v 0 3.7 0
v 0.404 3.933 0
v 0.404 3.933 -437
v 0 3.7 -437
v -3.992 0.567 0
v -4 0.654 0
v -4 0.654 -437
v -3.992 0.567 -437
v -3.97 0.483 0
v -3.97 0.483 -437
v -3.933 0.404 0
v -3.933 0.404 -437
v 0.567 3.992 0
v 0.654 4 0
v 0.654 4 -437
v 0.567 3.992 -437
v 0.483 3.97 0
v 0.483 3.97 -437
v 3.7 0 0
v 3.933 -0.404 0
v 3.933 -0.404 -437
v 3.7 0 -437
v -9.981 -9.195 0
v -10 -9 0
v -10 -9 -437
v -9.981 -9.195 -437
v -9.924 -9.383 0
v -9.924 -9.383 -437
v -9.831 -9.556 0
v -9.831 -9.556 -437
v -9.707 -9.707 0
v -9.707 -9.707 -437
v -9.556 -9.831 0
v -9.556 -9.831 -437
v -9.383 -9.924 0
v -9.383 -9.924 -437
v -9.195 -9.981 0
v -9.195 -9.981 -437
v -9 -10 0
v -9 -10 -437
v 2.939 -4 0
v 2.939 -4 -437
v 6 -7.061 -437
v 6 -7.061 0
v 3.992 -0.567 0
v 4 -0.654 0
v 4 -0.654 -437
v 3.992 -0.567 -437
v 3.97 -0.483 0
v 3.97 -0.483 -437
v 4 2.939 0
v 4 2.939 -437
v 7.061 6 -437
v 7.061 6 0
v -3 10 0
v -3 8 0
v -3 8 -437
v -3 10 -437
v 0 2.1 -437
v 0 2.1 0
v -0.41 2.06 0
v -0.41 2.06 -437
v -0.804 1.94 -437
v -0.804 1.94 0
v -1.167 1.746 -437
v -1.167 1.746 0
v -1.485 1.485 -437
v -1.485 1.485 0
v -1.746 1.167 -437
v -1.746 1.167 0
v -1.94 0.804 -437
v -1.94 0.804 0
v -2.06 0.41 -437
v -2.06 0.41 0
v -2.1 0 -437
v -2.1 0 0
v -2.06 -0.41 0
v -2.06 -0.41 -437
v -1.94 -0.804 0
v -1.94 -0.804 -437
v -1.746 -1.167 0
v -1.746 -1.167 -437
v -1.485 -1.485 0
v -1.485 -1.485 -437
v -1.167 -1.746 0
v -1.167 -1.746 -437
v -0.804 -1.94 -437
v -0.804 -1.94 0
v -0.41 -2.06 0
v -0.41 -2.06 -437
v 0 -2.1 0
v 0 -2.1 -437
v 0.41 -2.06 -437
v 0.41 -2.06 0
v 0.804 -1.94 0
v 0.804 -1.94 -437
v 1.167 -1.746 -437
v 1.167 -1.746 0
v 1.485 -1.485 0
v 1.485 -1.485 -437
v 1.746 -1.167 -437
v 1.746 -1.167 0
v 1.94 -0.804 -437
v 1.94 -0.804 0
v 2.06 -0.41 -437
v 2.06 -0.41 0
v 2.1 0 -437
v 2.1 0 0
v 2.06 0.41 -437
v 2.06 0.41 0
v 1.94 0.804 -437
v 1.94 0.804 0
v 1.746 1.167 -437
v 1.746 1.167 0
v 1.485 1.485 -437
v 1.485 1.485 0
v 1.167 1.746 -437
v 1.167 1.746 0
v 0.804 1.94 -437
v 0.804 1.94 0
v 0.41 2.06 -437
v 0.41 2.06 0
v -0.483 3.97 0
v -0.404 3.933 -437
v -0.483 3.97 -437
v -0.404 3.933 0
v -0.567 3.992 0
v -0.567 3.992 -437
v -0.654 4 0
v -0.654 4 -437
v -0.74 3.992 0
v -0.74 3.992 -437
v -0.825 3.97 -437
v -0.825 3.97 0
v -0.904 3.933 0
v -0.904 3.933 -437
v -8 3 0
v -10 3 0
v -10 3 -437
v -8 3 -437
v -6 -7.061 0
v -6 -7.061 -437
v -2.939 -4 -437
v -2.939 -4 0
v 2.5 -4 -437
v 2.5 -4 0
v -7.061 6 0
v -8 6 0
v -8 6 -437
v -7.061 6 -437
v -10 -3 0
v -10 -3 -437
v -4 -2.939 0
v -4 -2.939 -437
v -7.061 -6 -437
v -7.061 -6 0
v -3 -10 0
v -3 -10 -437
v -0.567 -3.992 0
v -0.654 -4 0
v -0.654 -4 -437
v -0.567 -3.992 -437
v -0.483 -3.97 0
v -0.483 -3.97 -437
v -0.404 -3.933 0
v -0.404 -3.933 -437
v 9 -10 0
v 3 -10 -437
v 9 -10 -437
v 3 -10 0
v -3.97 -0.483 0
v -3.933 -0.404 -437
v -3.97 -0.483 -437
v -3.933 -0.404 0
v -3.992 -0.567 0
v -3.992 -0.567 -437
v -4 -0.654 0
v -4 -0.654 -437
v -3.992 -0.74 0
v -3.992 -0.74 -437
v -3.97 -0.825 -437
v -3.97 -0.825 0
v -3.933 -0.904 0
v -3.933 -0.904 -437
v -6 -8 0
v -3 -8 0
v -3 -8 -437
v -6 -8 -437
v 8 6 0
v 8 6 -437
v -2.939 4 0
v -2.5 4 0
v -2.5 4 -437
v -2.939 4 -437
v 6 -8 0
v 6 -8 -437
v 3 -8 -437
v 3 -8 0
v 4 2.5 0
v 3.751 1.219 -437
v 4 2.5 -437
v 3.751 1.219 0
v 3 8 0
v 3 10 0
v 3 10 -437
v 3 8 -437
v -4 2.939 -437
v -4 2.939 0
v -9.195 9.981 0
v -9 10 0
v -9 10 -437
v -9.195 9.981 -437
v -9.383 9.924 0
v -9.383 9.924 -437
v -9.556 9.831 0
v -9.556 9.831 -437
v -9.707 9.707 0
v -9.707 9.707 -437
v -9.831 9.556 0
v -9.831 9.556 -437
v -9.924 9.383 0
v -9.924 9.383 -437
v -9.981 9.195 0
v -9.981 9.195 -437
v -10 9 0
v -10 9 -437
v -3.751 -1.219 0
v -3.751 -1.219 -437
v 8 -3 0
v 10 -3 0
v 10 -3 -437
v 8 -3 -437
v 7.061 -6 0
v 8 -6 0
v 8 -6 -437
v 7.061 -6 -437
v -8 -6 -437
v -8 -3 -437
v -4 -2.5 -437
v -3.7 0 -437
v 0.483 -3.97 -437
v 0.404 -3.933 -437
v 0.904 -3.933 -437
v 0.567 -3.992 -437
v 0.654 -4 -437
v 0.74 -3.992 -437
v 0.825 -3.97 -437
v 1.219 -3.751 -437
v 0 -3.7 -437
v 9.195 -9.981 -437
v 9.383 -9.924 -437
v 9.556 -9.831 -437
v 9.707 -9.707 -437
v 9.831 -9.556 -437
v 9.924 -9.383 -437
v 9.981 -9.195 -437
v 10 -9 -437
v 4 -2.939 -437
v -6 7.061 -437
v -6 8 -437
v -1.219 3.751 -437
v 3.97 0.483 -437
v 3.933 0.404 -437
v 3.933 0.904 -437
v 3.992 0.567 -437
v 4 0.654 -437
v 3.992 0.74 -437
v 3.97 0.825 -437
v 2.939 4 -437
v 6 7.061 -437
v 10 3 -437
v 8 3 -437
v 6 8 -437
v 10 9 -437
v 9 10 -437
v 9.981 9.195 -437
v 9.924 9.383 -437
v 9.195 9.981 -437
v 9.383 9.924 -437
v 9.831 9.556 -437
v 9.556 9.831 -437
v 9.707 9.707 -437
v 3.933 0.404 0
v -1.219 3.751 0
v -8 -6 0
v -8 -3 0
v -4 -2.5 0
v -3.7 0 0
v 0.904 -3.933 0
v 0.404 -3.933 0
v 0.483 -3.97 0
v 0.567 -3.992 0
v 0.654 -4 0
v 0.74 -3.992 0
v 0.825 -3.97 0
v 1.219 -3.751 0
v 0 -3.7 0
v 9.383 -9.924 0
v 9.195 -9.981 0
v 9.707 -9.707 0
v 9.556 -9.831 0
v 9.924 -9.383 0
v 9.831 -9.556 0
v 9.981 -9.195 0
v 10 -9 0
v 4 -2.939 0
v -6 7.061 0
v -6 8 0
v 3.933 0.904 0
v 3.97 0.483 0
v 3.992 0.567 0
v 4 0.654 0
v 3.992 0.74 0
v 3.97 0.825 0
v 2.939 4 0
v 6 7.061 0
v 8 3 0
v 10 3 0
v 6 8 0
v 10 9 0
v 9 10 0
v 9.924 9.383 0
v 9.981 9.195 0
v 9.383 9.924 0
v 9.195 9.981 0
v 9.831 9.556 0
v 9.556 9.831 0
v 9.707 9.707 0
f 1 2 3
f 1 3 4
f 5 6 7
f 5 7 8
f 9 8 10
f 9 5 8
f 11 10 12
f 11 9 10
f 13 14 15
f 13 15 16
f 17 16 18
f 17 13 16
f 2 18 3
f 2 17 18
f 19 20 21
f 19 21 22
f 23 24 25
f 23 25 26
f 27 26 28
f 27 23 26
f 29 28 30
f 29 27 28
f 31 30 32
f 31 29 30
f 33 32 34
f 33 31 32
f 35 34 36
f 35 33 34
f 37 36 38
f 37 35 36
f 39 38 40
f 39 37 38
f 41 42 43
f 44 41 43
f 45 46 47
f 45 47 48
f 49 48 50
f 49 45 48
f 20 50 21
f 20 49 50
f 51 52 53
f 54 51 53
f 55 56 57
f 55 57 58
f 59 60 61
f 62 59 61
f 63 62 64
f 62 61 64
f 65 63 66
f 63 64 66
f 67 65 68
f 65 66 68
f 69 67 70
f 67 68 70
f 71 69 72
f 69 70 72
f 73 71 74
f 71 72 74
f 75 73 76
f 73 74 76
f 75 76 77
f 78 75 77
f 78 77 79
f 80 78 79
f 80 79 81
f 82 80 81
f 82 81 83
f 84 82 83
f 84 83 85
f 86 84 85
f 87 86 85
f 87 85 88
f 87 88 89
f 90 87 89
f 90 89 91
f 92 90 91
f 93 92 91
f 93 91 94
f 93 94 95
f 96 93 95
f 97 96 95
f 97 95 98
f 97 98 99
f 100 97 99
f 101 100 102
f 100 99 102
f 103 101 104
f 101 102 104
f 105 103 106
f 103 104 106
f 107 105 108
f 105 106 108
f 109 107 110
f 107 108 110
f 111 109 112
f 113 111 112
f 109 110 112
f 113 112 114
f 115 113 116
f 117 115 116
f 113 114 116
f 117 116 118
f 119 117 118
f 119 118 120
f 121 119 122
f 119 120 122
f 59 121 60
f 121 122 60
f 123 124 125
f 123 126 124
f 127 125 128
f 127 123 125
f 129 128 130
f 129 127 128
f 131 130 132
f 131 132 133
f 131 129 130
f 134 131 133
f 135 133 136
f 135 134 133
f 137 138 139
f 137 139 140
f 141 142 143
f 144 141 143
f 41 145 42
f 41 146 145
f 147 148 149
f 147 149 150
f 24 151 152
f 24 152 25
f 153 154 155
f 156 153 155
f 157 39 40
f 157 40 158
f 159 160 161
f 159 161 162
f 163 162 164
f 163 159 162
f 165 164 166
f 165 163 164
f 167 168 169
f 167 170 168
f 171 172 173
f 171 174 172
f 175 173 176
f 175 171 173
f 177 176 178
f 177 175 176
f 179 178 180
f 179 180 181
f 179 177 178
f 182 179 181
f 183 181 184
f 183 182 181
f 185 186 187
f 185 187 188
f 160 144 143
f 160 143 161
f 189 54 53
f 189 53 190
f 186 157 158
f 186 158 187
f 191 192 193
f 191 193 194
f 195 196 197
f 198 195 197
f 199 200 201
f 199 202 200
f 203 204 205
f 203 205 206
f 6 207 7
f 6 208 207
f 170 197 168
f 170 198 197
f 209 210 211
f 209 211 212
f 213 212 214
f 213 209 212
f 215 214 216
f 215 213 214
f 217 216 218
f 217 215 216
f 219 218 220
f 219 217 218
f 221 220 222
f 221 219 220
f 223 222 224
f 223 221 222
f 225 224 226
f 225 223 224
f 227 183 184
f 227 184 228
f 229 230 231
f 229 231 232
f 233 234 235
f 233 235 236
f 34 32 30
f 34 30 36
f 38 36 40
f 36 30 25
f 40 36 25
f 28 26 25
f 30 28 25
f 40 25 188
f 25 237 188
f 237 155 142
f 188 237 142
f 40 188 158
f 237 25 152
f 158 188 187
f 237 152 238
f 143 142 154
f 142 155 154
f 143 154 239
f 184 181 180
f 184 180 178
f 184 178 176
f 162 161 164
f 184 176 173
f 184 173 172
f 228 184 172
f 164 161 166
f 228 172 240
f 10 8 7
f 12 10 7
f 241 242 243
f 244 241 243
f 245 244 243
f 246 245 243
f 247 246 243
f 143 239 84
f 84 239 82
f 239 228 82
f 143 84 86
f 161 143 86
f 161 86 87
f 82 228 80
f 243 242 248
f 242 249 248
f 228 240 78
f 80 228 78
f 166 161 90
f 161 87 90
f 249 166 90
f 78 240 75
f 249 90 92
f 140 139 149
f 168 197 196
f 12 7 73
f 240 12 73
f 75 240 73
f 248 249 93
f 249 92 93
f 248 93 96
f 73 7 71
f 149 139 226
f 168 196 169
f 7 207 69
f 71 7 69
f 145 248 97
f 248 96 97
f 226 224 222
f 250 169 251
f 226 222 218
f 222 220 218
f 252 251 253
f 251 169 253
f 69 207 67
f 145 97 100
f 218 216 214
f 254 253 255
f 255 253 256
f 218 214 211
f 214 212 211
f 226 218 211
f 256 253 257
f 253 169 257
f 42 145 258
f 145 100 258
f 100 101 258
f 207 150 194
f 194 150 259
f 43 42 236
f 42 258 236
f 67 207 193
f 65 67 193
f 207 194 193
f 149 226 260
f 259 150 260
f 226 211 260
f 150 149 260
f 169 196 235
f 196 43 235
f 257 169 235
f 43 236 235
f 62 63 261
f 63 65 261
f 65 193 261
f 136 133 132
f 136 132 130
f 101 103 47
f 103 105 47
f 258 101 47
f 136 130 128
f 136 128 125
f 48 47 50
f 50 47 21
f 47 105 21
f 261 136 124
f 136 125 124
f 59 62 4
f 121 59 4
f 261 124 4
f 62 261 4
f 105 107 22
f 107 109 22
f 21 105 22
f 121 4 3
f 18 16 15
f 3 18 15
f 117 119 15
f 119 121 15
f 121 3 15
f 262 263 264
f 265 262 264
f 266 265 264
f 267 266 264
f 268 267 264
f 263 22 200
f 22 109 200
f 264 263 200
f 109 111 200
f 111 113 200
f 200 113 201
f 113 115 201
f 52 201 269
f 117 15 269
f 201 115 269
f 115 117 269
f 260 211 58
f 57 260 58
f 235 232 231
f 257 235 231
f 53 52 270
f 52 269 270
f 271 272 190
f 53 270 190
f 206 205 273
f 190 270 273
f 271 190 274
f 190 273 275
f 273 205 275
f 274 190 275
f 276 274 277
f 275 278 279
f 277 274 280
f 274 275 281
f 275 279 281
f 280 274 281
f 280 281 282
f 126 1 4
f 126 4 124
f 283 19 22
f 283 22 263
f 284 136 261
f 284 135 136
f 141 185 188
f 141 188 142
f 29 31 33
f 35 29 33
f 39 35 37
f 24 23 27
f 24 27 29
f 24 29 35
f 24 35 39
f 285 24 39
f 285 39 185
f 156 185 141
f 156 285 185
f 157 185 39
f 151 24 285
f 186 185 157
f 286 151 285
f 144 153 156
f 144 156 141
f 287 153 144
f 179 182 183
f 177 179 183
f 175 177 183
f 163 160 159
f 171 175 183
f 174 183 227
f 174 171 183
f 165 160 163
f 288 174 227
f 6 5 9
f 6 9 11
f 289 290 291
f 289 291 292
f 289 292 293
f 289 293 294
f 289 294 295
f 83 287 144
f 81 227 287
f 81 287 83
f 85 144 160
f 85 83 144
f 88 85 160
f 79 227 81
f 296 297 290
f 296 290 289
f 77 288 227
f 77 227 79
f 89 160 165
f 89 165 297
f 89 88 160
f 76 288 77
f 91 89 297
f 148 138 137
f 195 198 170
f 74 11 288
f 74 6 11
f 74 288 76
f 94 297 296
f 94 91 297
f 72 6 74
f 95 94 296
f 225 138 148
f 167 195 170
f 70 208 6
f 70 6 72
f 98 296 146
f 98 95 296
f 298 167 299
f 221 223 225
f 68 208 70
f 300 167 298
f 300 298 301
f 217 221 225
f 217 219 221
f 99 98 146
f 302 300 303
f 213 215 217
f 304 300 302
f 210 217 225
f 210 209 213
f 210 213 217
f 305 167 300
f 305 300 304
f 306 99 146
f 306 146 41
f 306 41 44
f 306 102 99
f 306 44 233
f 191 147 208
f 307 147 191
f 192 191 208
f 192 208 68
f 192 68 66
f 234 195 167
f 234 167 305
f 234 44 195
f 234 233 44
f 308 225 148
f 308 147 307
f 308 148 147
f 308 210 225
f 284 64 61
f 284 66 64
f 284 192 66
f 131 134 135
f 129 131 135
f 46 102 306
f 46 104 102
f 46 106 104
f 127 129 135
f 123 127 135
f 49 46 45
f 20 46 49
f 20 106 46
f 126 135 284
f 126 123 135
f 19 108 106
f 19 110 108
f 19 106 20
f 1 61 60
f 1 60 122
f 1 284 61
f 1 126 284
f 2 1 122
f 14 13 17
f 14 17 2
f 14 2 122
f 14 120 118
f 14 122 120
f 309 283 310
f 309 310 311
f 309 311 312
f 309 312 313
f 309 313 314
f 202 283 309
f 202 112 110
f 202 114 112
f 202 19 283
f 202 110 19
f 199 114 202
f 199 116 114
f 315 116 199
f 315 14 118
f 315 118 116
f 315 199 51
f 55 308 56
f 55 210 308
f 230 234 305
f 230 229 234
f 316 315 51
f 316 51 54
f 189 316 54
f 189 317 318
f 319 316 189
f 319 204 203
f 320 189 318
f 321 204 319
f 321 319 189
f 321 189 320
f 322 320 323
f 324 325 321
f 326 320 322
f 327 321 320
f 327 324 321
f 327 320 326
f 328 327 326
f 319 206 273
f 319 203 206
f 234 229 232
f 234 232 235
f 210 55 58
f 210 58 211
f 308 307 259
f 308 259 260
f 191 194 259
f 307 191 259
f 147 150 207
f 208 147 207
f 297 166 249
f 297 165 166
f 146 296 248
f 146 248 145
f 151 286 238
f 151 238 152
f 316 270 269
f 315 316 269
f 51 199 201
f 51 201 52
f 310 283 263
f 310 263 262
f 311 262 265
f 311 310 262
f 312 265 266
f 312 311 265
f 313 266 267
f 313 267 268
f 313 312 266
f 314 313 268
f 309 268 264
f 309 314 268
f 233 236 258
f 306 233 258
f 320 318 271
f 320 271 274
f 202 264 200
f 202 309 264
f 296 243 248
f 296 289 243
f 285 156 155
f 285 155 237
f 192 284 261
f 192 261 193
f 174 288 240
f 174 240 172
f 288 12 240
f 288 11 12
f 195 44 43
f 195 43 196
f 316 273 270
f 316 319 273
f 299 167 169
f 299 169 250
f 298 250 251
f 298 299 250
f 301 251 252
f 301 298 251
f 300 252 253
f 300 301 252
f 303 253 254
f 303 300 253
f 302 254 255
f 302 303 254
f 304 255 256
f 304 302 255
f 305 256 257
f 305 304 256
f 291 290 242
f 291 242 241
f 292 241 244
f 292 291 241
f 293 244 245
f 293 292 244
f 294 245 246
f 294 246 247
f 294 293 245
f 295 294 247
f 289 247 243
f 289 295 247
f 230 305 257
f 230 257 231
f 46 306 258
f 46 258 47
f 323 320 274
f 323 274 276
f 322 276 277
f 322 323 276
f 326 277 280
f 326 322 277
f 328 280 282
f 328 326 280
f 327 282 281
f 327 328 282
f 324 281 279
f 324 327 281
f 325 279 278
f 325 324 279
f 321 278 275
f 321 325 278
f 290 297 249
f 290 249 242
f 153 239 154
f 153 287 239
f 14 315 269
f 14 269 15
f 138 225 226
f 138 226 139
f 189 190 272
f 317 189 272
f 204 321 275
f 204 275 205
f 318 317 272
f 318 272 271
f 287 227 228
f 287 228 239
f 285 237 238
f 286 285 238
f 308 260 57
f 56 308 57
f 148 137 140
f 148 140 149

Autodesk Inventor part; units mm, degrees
sketch "Sketch_75" plane through (0, 0, 0) normal (0, 0, 1) x (1, 0, 0)
  line L0 (-10, -3) -> (-10, -9)
  arc A0 (-10, -9) -> (-9, -10) centre (-9, -9) ccw
  line L1 (-9, -10) -> (-3, -10)
  line L2 (-3, -10) -> (-3, -8)
  line L3 (-3, -8) -> (-6, -8)
  line L4 (-6, -8) -> (-6, -7.0607)
  line L5 (-6, -7.0607) -> (-2.9393, -4)
  line L6 (-2.9393, -4) -> (-0.6536, -4)
  arc A1 (-0.6536, -4) -> (-0.4036, -3.933) centre (-0.6536, -3.5) ccw
  line L7 (-0.4036, -3.933) -> (0, -3.7)
  line L8 (0, -3.7) -> (0.4036, -3.933)
  arc A2 (0.4036, -3.933) -> (0.9036, -3.933) centre (0.6536, -3.5) ccw
  line L9 (0.9036, -3.933) -> (1.2189, -3.751)
  line L10 (1.2189, -3.751) -> (2.5, -4)
  line L11 (2.5, -4) -> (2.9393, -4)
  line L12 (2.9393, -4) -> (6, -7.0607)
  line L13 (6, -7.0607) -> (6, -8)
  line L14 (6, -8) -> (3, -8)
  line L15 (3, -8) -> (3, -10)
  line L16 (3, -10) -> (9, -10)
  arc A3 (9, -10) -> (10, -9) centre (9, -9) ccw
  line L17 (10, -9) -> (10, -3)
  line L18 (10, -3) -> (8, -3)
  line L19 (8, -3) -> (8, -6)
  line L20 (8, -6) -> (7.0607, -6)
  line L21 (7.0607, -6) -> (4, -2.9393)
  line L22 (4, -2.9393) -> (4, -0.6536)
  arc A4 (4, -0.6536) -> (3.933, -0.4036) centre (3.5, -0.6536) ccw
  line L23 (3.933, -0.4036) -> (3.7, 0)
  line L24 (3.7, 0) -> (3.933, 0.4036)
  arc A5 (3.933, 0.4036) -> (3.933, 0.9036) centre (3.5, 0.6536) ccw
  line L25 (3.933, 0.9036) -> (3.751, 1.2189)
  line L26 (3.751, 1.2189) -> (4, 2.5)
  line L27 (4, 2.5) -> (4, 2.9393)
  line L28 (4, 2.9393) -> (7.0607, 6)
  line L29 (7.0607, 6) -> (8, 6)
  line L30 (8, 6) -> (8, 3)
  line L31 (8, 3) -> (10, 3)
  line L32 (10, 3) -> (10, 9)
  arc A6 (10, 9) -> (9, 10) centre (9, 9) ccw
  line L33 (9, 10) -> (3, 10)
  line L34 (3, 10) -> (3, 8)
  line L35 (3, 8) -> (6, 8)
  line L36 (6, 8) -> (6, 7.0607)
  line L37 (6, 7.0607) -> (2.9393, 4)
  line L38 (2.9393, 4) -> (0.6536, 4)
  arc A7 (0.6536, 4) -> (0.4036, 3.933) centre (0.6536, 3.5) ccw
  line L39 (0.4036, 3.933) -> (0, 3.7)
  line L40 (0, 3.7) -> (-0.4036, 3.933)
  arc A8 (-0.4036, 3.933) -> (-0.9036, 3.933) centre (-0.6536, 3.5) ccw
  line L41 (-0.9036, 3.933) -> (-1.2189, 3.751)
  line L42 (-1.2189, 3.751) -> (-2.5, 4)
  line L43 (-2.5, 4) -> (-2.9393, 4)
  line L44 (-2.9393, 4) -> (-6, 7.0607)
  line L45 (-6, 7.0607) -> (-6, 8)
  line L46 (-6, 8) -> (-3, 8)
  line L47 (-3, 8) -> (-3, 10)
  line L48 (-3, 10) -> (-9, 10)
  arc A9 (-9, 10) -> (-10, 9) centre (-9, 9) ccw
  line L49 (-10, 9) -> (-10, 3)
  line L50 (-10, 3) -> (-8, 3)
  line L51 (-8, 3) -> (-8, 6)
  line L52 (-8, 6) -> (-7.0607, 6)
  line L53 (-7.0607, 6) -> (-4, 2.9393)
  line L54 (-4, 2.9393) -> (-4, 0.6536)
  arc A10 (-4, 0.6536) -> (-3.933, 0.4036) centre (-3.5, 0.6536) ccw
  line L55 (-3.933, 0.4036) -> (-3.7, 0)
  line L56 (-3.7, 0) -> (-3.933, -0.4036)
  arc A11 (-3.933, -0.4036) -> (-3.933, -0.9036) centre (-3.5, -0.6536) ccw
  line L57 (-3.933, -0.9036) -> (-3.751, -1.2189)
  line L58 (-3.751, -1.2189) -> (-4, -2.5)
  line L59 (-4, -2.5) -> (-4, -2.9393)
  line L60 (-4, -2.9393) -> (-7.0607, -6)
  line L61 (-7.0607, -6) -> (-8, -6)
  line L62 (-8, -6) -> (-8, -3)
  line L63 (-8, -3) -> (-10, -3)
extrude "Extrusion1" add sketch "Sketch_75" against normal blind 437
sketch "Sketch2" plane through (0, 0, -437) normal (0, 0, -1) x (-1, 0, 0)
  point P0 (0, 0)
hole "Hole1" at (0, 0, -437) direction (0, 0, 1) diameter 4.2 depth 437
ref_plane "C1_XY" through (0, 0, 0) normal (0, 0, 1) x (1, 0, 0)
ref_plane "C1_YZ" through (0, 0, 0) normal (1, 0, 0) x (0, 1, 0)
ref_plane "C1_ZX" through (0, 0, 0) normal (0, 1, 0) x (0, 0, 1)
properties part number "NFS5-2020-437"
